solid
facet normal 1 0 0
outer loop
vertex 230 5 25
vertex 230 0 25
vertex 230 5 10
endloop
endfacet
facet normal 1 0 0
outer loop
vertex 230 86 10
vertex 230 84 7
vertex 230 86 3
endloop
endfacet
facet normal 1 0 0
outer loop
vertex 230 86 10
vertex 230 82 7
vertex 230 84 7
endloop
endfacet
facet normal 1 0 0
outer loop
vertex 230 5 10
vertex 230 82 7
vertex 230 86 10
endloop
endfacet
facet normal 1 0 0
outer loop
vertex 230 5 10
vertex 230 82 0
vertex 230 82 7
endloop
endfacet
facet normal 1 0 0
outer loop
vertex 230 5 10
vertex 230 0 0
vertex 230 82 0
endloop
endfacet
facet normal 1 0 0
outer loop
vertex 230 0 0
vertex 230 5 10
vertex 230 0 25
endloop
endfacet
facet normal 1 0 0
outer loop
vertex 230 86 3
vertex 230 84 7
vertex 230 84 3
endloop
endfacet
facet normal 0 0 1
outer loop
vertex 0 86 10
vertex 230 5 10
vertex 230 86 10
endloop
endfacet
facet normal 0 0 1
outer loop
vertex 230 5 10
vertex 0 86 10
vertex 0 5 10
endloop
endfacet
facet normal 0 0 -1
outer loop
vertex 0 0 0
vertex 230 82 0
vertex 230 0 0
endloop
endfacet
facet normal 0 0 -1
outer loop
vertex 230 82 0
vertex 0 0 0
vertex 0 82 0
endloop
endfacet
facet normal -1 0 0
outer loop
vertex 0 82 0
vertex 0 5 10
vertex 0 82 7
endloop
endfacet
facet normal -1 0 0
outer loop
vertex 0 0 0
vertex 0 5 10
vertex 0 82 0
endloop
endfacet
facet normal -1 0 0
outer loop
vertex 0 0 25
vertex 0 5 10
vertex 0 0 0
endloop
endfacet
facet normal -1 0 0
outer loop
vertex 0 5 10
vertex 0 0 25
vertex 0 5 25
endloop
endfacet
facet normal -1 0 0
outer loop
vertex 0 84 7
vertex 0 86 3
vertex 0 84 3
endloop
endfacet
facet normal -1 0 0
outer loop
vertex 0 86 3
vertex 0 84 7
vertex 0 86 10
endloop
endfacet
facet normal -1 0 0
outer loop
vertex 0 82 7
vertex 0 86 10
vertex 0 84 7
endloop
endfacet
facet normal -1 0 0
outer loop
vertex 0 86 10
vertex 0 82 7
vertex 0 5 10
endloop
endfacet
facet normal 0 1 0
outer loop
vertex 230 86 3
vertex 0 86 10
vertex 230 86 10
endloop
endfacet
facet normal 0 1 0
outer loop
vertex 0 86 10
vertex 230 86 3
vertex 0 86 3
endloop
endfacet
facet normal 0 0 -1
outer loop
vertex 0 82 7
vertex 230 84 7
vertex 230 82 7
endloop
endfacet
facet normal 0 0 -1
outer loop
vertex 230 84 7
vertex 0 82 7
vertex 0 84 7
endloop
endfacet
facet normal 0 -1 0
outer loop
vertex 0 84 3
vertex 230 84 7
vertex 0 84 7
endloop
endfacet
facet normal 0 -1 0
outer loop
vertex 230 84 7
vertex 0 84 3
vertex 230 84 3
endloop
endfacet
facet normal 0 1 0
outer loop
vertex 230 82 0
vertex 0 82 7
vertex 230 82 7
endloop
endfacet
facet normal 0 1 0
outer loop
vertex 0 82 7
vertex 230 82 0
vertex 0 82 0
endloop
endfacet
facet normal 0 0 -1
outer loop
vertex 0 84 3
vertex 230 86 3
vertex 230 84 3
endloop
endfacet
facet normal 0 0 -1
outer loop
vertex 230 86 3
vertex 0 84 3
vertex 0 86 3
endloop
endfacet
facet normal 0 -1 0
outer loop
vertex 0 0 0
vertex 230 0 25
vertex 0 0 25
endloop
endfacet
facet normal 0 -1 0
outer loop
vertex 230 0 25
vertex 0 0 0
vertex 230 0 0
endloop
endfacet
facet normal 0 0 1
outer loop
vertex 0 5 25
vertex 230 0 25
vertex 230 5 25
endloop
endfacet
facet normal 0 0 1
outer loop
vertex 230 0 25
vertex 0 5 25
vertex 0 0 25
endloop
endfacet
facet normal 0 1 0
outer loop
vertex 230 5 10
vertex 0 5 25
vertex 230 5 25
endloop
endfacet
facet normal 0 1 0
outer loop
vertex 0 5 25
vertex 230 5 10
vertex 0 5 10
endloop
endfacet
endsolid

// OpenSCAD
cube([230,80,10]);
cube([230,5,25]);
difference()
{
  translate([0,80,0]) cube([230,6,10]);
  translate([-1,82,-1]) cube([240,2,8]);
  translate([-1,83,-1]) cube([240,6,4]);
}
